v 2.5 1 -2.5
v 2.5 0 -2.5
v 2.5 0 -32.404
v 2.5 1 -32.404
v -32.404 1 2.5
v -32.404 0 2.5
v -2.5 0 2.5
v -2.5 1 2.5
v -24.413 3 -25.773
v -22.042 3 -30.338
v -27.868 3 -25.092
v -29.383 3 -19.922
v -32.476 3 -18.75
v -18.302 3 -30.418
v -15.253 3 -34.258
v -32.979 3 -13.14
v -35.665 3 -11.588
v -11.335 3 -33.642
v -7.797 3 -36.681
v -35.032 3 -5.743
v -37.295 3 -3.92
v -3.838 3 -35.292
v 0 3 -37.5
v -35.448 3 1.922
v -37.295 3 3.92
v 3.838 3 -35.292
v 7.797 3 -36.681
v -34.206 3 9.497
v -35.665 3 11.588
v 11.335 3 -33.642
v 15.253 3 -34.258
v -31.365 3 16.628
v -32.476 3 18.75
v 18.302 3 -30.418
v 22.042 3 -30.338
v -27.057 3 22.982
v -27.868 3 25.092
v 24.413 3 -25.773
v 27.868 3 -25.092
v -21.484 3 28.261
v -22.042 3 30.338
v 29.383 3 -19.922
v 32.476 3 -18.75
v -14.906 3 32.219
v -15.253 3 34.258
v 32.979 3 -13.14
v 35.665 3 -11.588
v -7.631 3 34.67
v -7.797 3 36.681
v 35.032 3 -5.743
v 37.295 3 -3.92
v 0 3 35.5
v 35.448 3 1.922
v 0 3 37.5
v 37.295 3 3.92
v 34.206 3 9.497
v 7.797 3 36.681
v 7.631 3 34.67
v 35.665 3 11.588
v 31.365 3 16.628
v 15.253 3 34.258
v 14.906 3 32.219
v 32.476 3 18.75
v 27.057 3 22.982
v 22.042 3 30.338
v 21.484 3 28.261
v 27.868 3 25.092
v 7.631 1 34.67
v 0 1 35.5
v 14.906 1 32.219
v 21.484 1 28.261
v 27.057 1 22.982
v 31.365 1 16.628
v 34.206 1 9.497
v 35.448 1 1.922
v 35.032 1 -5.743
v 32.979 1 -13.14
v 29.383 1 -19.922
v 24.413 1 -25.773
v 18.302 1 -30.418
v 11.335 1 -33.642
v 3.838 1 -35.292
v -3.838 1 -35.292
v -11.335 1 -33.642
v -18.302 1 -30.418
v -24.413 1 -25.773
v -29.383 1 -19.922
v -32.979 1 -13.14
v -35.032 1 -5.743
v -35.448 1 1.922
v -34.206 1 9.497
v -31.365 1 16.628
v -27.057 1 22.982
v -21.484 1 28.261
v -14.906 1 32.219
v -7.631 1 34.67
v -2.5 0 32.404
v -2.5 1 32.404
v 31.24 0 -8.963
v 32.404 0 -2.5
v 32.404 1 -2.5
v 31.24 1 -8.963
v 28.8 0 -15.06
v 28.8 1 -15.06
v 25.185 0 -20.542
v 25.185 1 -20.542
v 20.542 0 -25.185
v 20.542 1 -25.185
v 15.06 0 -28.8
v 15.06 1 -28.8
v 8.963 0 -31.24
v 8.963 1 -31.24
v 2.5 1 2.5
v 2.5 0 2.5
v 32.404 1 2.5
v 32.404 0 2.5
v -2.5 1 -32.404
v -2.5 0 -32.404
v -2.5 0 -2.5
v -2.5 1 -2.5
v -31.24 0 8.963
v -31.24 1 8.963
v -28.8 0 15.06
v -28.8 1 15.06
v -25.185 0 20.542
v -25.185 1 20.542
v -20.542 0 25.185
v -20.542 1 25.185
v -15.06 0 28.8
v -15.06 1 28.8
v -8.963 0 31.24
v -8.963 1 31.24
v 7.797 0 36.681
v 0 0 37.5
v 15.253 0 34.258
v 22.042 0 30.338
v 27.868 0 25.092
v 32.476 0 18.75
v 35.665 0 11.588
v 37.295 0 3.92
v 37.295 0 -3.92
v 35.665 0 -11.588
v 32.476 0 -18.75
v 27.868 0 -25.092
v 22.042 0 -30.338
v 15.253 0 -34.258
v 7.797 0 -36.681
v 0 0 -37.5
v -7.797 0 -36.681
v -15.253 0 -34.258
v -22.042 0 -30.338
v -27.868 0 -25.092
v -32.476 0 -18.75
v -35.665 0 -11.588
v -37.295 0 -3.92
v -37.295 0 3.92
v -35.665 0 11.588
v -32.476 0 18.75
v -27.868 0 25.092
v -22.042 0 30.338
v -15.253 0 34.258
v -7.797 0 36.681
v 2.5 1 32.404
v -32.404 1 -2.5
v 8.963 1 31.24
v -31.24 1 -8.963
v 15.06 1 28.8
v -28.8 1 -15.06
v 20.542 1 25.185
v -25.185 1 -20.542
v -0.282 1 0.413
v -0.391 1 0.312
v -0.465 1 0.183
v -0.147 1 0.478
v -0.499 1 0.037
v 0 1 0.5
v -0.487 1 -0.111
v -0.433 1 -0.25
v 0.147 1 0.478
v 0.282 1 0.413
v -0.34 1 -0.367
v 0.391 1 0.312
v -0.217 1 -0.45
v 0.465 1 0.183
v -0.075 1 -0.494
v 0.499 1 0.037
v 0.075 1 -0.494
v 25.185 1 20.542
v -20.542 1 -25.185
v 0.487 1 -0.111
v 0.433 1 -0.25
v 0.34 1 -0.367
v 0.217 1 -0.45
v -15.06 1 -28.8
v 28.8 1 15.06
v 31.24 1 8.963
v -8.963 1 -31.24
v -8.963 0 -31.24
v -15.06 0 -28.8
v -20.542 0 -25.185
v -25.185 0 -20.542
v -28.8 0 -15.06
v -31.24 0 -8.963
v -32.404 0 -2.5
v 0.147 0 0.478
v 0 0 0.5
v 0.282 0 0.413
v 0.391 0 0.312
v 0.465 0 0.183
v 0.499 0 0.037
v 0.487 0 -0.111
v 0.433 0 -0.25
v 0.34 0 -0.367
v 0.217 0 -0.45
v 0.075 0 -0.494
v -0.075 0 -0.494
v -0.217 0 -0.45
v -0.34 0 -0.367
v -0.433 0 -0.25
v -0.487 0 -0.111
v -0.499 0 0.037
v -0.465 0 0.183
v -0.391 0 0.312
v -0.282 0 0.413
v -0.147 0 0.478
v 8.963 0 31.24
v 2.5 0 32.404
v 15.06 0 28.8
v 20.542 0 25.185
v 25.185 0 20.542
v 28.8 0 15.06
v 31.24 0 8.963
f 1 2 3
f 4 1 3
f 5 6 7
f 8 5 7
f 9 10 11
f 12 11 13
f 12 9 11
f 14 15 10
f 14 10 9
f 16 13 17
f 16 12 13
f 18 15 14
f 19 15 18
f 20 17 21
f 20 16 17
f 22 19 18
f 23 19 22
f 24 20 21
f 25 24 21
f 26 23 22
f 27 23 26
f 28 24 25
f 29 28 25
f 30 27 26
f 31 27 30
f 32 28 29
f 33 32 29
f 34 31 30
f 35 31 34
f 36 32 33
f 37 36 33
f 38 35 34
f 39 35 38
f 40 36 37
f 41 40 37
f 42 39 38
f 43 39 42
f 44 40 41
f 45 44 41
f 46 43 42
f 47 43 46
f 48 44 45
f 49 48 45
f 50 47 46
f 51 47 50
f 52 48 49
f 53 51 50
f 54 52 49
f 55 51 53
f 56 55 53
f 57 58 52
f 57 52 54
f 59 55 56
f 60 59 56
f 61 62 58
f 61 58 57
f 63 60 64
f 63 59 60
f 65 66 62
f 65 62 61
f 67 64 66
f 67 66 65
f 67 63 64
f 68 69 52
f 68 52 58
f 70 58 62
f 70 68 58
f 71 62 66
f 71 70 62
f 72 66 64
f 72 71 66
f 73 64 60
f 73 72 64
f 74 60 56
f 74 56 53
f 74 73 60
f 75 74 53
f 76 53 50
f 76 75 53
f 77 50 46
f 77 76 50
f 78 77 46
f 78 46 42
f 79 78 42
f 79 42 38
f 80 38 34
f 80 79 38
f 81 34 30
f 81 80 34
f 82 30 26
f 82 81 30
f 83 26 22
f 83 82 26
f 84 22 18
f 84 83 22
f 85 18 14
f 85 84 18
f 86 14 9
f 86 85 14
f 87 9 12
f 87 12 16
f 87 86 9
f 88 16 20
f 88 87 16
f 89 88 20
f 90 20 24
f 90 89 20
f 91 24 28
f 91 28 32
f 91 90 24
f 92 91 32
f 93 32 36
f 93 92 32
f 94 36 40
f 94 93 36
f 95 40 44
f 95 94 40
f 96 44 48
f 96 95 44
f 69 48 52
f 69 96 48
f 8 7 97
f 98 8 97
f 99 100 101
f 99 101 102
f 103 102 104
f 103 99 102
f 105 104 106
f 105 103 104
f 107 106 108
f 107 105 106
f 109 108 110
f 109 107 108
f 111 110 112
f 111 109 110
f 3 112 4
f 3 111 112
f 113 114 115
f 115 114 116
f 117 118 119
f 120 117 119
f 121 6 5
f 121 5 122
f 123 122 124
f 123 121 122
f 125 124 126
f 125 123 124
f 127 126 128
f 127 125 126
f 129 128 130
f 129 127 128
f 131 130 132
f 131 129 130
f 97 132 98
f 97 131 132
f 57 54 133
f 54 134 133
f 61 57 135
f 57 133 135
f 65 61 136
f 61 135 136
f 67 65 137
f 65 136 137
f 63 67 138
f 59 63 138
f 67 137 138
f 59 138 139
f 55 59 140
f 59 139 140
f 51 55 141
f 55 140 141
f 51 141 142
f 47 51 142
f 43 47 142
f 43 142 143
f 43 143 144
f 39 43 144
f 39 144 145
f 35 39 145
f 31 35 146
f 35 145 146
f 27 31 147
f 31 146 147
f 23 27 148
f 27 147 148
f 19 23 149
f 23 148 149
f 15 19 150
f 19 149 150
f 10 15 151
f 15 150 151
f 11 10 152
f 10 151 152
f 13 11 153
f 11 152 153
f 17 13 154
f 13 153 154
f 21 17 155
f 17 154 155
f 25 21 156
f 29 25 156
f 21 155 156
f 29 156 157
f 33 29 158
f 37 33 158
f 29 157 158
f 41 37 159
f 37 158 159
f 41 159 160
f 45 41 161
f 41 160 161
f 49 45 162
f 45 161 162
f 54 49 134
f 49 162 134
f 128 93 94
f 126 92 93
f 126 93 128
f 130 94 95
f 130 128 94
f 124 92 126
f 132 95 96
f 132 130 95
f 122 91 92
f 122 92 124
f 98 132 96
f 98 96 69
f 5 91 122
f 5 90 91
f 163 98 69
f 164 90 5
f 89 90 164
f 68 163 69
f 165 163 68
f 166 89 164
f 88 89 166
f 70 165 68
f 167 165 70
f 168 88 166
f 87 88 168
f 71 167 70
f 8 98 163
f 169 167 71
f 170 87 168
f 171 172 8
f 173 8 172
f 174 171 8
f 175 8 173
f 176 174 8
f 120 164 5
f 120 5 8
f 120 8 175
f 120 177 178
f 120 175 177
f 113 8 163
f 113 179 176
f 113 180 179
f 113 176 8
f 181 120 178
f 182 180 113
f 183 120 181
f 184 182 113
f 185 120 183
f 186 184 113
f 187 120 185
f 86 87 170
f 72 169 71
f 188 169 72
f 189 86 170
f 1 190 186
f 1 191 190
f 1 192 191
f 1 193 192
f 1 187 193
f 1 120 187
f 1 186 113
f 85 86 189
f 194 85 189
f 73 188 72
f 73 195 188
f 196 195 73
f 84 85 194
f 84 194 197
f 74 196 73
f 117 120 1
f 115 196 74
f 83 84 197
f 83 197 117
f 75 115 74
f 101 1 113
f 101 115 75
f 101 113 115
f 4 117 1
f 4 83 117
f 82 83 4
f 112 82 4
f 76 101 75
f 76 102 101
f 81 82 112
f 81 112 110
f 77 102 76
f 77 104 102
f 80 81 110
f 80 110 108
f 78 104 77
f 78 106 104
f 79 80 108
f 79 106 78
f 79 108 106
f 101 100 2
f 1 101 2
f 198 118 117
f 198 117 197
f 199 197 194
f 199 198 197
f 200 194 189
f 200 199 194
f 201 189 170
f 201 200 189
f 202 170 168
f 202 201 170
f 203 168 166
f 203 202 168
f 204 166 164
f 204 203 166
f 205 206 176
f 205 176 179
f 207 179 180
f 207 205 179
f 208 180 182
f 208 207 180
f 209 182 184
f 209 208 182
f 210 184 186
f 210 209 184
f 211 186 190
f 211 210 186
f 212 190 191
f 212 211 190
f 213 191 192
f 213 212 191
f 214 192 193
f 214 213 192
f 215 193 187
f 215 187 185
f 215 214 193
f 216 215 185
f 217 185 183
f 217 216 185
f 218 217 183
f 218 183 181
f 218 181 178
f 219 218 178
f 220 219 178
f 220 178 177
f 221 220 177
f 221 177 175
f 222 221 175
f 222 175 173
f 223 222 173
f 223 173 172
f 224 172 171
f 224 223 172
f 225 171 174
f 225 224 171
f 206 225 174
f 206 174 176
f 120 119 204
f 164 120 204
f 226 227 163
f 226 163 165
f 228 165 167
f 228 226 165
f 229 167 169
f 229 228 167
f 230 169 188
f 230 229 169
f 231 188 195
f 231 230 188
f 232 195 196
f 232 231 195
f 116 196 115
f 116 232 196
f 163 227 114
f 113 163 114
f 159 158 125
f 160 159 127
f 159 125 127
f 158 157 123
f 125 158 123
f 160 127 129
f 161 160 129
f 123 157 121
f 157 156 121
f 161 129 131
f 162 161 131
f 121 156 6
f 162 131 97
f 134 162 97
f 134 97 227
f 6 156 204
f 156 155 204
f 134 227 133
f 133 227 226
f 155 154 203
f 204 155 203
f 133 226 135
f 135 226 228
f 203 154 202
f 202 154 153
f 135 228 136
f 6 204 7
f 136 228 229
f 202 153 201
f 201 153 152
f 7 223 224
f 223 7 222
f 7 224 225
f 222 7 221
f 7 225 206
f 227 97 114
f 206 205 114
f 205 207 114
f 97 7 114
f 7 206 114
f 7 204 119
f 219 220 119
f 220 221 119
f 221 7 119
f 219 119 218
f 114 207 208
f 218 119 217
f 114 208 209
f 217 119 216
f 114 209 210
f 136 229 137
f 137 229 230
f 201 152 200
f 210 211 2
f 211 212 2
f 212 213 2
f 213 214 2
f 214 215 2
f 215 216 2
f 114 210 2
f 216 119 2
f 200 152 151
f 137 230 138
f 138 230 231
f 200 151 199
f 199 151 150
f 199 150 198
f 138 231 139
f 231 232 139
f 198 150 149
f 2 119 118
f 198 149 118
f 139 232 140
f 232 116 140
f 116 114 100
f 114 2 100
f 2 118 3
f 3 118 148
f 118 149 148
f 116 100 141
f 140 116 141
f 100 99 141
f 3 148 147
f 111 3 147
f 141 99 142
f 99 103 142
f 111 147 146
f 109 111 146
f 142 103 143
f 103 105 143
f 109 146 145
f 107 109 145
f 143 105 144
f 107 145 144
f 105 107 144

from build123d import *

# Parameters (mm, degrees)
SKETCH1_R           = 37.5
SKETCH1_R_2         = 32.5
SKETCH1_W           = 5
SKETCH1_H           = 5
SKETCH1_R_3         = 0.5
BOSS_EXTRUDE1_DEPTH = 1
SKETCH2_R           = 37.5
SKETCH2_R_2         = 35.5
BOSS_EXTRUDE2_DEPTH = 2


with BuildPart() as part:
    # Sketch1 → Boss-Extrude1 (new body)
    # profile 1 of 6: a face of its own
    with BuildSketch(Plane(origin=(0, 0, 0), x_dir=(1, 0, 0), z_dir=(0, 1, 0))):
        with Locations(Location((0, 0, 0), (0, 0, 270))):
            Circle(SKETCH1_R)
        Circle(SKETCH1_R_2, mode=Mode.SUBTRACT)
    # profile 2 of 6: a face of its own
    with BuildSketch(Plane(origin=(0, 0, 0), x_dir=(1, 0, 0), z_dir=(0, 1, 0))):
        with BuildLine():
            ThreePointArc((2.5, 32.403703492), (0, 32.5), (-2.5, 32.403703492))
            Line((-2.5, 32.403703492), (-2.5, 2.5))
            Line((-2.5, 2.5), (2.5, 2.5))
            Line((2.5, 2.5), (2.5, 32.403703492))
        make_face()
    # profile 3 of 6: a face of its own
    with BuildSketch(Plane(origin=(0, 0, 0), x_dir=(1, 0, 0), z_dir=(0, 1, 0))):
        with BuildLine():
            Line((2.5, -2.5), (-2.5, -2.5))
            Line((-2.5, -2.5), (-2.5, -32.403703492))
            ThreePointArc((-2.5, -32.403703492), (0, -32.5), (2.5, -32.403703492))
            Line((2.5, -32.403703492), (2.5, -2.5))
        make_face()
    # profile 4 of 6: a face of its own
    with BuildSketch(Plane(origin=(0, 0, 0), x_dir=(1, 0, 0), z_dir=(0, 1, 0))):
        with BuildLine():
            Line((-2.5, -2.5), (-2.5, 2.5))
            Line((-2.5, 2.5), (-32.403703492, 2.5))
            ThreePointArc((-32.403703492, 2.5), (-32.5, 0), (-32.403703492, -2.5))
            Line((-32.403703492, -2.5), (-2.5, -2.5))
        make_face()
    # profile 5 of 6: a face of its own
    with BuildSketch(Plane(origin=(0, 0, 0), x_dir=(1, 0, 0), z_dir=(0, 1, 0))):
        with BuildLine():
            Line((32.403703492, 2.5), (2.5, 2.5))
            Line((2.5, 2.5), (2.5, -2.5))
            Line((2.5, -2.5), (32.403703492, -2.5))
            ThreePointArc((32.403703492, -2.5), (32.47591695, -1.250926958), (32.5, 0))
            ThreePointArc((32.5, 0), (32.47591695, 1.250926958), (32.403703492, 2.5))
        make_face()
    # profile 6 of 6: a face of its own
    with BuildSketch(Plane(origin=(0, 0, 0), x_dir=(1, 0, 0), z_dir=(0, 1, 0))):
        Rectangle(SKETCH1_W, SKETCH1_H)
        with Locations(Location((0, 0, 0), (0, 0, 270))):
            Circle(SKETCH1_R_3, mode=Mode.SUBTRACT)
    extrude(amount=BOSS_EXTRUDE1_DEPTH)

    # Sketch2 → Boss-Extrude2 (add)
    with BuildSketch(Plane(origin=(0, 1, 0), x_dir=(1, 0, 0), z_dir=(0, 1, 0))):
        with Locations(Location((0, 0, 0), (0, 0, 270))):
            Circle(SKETCH2_R)
        with Locations(Location((0, 0, 0), (0, 0, 270))):
            Circle(SKETCH2_R_2, mode=Mode.SUBTRACT)
    extrude(amount=BOSS_EXTRUDE2_DEPTH)


solid = part.part
